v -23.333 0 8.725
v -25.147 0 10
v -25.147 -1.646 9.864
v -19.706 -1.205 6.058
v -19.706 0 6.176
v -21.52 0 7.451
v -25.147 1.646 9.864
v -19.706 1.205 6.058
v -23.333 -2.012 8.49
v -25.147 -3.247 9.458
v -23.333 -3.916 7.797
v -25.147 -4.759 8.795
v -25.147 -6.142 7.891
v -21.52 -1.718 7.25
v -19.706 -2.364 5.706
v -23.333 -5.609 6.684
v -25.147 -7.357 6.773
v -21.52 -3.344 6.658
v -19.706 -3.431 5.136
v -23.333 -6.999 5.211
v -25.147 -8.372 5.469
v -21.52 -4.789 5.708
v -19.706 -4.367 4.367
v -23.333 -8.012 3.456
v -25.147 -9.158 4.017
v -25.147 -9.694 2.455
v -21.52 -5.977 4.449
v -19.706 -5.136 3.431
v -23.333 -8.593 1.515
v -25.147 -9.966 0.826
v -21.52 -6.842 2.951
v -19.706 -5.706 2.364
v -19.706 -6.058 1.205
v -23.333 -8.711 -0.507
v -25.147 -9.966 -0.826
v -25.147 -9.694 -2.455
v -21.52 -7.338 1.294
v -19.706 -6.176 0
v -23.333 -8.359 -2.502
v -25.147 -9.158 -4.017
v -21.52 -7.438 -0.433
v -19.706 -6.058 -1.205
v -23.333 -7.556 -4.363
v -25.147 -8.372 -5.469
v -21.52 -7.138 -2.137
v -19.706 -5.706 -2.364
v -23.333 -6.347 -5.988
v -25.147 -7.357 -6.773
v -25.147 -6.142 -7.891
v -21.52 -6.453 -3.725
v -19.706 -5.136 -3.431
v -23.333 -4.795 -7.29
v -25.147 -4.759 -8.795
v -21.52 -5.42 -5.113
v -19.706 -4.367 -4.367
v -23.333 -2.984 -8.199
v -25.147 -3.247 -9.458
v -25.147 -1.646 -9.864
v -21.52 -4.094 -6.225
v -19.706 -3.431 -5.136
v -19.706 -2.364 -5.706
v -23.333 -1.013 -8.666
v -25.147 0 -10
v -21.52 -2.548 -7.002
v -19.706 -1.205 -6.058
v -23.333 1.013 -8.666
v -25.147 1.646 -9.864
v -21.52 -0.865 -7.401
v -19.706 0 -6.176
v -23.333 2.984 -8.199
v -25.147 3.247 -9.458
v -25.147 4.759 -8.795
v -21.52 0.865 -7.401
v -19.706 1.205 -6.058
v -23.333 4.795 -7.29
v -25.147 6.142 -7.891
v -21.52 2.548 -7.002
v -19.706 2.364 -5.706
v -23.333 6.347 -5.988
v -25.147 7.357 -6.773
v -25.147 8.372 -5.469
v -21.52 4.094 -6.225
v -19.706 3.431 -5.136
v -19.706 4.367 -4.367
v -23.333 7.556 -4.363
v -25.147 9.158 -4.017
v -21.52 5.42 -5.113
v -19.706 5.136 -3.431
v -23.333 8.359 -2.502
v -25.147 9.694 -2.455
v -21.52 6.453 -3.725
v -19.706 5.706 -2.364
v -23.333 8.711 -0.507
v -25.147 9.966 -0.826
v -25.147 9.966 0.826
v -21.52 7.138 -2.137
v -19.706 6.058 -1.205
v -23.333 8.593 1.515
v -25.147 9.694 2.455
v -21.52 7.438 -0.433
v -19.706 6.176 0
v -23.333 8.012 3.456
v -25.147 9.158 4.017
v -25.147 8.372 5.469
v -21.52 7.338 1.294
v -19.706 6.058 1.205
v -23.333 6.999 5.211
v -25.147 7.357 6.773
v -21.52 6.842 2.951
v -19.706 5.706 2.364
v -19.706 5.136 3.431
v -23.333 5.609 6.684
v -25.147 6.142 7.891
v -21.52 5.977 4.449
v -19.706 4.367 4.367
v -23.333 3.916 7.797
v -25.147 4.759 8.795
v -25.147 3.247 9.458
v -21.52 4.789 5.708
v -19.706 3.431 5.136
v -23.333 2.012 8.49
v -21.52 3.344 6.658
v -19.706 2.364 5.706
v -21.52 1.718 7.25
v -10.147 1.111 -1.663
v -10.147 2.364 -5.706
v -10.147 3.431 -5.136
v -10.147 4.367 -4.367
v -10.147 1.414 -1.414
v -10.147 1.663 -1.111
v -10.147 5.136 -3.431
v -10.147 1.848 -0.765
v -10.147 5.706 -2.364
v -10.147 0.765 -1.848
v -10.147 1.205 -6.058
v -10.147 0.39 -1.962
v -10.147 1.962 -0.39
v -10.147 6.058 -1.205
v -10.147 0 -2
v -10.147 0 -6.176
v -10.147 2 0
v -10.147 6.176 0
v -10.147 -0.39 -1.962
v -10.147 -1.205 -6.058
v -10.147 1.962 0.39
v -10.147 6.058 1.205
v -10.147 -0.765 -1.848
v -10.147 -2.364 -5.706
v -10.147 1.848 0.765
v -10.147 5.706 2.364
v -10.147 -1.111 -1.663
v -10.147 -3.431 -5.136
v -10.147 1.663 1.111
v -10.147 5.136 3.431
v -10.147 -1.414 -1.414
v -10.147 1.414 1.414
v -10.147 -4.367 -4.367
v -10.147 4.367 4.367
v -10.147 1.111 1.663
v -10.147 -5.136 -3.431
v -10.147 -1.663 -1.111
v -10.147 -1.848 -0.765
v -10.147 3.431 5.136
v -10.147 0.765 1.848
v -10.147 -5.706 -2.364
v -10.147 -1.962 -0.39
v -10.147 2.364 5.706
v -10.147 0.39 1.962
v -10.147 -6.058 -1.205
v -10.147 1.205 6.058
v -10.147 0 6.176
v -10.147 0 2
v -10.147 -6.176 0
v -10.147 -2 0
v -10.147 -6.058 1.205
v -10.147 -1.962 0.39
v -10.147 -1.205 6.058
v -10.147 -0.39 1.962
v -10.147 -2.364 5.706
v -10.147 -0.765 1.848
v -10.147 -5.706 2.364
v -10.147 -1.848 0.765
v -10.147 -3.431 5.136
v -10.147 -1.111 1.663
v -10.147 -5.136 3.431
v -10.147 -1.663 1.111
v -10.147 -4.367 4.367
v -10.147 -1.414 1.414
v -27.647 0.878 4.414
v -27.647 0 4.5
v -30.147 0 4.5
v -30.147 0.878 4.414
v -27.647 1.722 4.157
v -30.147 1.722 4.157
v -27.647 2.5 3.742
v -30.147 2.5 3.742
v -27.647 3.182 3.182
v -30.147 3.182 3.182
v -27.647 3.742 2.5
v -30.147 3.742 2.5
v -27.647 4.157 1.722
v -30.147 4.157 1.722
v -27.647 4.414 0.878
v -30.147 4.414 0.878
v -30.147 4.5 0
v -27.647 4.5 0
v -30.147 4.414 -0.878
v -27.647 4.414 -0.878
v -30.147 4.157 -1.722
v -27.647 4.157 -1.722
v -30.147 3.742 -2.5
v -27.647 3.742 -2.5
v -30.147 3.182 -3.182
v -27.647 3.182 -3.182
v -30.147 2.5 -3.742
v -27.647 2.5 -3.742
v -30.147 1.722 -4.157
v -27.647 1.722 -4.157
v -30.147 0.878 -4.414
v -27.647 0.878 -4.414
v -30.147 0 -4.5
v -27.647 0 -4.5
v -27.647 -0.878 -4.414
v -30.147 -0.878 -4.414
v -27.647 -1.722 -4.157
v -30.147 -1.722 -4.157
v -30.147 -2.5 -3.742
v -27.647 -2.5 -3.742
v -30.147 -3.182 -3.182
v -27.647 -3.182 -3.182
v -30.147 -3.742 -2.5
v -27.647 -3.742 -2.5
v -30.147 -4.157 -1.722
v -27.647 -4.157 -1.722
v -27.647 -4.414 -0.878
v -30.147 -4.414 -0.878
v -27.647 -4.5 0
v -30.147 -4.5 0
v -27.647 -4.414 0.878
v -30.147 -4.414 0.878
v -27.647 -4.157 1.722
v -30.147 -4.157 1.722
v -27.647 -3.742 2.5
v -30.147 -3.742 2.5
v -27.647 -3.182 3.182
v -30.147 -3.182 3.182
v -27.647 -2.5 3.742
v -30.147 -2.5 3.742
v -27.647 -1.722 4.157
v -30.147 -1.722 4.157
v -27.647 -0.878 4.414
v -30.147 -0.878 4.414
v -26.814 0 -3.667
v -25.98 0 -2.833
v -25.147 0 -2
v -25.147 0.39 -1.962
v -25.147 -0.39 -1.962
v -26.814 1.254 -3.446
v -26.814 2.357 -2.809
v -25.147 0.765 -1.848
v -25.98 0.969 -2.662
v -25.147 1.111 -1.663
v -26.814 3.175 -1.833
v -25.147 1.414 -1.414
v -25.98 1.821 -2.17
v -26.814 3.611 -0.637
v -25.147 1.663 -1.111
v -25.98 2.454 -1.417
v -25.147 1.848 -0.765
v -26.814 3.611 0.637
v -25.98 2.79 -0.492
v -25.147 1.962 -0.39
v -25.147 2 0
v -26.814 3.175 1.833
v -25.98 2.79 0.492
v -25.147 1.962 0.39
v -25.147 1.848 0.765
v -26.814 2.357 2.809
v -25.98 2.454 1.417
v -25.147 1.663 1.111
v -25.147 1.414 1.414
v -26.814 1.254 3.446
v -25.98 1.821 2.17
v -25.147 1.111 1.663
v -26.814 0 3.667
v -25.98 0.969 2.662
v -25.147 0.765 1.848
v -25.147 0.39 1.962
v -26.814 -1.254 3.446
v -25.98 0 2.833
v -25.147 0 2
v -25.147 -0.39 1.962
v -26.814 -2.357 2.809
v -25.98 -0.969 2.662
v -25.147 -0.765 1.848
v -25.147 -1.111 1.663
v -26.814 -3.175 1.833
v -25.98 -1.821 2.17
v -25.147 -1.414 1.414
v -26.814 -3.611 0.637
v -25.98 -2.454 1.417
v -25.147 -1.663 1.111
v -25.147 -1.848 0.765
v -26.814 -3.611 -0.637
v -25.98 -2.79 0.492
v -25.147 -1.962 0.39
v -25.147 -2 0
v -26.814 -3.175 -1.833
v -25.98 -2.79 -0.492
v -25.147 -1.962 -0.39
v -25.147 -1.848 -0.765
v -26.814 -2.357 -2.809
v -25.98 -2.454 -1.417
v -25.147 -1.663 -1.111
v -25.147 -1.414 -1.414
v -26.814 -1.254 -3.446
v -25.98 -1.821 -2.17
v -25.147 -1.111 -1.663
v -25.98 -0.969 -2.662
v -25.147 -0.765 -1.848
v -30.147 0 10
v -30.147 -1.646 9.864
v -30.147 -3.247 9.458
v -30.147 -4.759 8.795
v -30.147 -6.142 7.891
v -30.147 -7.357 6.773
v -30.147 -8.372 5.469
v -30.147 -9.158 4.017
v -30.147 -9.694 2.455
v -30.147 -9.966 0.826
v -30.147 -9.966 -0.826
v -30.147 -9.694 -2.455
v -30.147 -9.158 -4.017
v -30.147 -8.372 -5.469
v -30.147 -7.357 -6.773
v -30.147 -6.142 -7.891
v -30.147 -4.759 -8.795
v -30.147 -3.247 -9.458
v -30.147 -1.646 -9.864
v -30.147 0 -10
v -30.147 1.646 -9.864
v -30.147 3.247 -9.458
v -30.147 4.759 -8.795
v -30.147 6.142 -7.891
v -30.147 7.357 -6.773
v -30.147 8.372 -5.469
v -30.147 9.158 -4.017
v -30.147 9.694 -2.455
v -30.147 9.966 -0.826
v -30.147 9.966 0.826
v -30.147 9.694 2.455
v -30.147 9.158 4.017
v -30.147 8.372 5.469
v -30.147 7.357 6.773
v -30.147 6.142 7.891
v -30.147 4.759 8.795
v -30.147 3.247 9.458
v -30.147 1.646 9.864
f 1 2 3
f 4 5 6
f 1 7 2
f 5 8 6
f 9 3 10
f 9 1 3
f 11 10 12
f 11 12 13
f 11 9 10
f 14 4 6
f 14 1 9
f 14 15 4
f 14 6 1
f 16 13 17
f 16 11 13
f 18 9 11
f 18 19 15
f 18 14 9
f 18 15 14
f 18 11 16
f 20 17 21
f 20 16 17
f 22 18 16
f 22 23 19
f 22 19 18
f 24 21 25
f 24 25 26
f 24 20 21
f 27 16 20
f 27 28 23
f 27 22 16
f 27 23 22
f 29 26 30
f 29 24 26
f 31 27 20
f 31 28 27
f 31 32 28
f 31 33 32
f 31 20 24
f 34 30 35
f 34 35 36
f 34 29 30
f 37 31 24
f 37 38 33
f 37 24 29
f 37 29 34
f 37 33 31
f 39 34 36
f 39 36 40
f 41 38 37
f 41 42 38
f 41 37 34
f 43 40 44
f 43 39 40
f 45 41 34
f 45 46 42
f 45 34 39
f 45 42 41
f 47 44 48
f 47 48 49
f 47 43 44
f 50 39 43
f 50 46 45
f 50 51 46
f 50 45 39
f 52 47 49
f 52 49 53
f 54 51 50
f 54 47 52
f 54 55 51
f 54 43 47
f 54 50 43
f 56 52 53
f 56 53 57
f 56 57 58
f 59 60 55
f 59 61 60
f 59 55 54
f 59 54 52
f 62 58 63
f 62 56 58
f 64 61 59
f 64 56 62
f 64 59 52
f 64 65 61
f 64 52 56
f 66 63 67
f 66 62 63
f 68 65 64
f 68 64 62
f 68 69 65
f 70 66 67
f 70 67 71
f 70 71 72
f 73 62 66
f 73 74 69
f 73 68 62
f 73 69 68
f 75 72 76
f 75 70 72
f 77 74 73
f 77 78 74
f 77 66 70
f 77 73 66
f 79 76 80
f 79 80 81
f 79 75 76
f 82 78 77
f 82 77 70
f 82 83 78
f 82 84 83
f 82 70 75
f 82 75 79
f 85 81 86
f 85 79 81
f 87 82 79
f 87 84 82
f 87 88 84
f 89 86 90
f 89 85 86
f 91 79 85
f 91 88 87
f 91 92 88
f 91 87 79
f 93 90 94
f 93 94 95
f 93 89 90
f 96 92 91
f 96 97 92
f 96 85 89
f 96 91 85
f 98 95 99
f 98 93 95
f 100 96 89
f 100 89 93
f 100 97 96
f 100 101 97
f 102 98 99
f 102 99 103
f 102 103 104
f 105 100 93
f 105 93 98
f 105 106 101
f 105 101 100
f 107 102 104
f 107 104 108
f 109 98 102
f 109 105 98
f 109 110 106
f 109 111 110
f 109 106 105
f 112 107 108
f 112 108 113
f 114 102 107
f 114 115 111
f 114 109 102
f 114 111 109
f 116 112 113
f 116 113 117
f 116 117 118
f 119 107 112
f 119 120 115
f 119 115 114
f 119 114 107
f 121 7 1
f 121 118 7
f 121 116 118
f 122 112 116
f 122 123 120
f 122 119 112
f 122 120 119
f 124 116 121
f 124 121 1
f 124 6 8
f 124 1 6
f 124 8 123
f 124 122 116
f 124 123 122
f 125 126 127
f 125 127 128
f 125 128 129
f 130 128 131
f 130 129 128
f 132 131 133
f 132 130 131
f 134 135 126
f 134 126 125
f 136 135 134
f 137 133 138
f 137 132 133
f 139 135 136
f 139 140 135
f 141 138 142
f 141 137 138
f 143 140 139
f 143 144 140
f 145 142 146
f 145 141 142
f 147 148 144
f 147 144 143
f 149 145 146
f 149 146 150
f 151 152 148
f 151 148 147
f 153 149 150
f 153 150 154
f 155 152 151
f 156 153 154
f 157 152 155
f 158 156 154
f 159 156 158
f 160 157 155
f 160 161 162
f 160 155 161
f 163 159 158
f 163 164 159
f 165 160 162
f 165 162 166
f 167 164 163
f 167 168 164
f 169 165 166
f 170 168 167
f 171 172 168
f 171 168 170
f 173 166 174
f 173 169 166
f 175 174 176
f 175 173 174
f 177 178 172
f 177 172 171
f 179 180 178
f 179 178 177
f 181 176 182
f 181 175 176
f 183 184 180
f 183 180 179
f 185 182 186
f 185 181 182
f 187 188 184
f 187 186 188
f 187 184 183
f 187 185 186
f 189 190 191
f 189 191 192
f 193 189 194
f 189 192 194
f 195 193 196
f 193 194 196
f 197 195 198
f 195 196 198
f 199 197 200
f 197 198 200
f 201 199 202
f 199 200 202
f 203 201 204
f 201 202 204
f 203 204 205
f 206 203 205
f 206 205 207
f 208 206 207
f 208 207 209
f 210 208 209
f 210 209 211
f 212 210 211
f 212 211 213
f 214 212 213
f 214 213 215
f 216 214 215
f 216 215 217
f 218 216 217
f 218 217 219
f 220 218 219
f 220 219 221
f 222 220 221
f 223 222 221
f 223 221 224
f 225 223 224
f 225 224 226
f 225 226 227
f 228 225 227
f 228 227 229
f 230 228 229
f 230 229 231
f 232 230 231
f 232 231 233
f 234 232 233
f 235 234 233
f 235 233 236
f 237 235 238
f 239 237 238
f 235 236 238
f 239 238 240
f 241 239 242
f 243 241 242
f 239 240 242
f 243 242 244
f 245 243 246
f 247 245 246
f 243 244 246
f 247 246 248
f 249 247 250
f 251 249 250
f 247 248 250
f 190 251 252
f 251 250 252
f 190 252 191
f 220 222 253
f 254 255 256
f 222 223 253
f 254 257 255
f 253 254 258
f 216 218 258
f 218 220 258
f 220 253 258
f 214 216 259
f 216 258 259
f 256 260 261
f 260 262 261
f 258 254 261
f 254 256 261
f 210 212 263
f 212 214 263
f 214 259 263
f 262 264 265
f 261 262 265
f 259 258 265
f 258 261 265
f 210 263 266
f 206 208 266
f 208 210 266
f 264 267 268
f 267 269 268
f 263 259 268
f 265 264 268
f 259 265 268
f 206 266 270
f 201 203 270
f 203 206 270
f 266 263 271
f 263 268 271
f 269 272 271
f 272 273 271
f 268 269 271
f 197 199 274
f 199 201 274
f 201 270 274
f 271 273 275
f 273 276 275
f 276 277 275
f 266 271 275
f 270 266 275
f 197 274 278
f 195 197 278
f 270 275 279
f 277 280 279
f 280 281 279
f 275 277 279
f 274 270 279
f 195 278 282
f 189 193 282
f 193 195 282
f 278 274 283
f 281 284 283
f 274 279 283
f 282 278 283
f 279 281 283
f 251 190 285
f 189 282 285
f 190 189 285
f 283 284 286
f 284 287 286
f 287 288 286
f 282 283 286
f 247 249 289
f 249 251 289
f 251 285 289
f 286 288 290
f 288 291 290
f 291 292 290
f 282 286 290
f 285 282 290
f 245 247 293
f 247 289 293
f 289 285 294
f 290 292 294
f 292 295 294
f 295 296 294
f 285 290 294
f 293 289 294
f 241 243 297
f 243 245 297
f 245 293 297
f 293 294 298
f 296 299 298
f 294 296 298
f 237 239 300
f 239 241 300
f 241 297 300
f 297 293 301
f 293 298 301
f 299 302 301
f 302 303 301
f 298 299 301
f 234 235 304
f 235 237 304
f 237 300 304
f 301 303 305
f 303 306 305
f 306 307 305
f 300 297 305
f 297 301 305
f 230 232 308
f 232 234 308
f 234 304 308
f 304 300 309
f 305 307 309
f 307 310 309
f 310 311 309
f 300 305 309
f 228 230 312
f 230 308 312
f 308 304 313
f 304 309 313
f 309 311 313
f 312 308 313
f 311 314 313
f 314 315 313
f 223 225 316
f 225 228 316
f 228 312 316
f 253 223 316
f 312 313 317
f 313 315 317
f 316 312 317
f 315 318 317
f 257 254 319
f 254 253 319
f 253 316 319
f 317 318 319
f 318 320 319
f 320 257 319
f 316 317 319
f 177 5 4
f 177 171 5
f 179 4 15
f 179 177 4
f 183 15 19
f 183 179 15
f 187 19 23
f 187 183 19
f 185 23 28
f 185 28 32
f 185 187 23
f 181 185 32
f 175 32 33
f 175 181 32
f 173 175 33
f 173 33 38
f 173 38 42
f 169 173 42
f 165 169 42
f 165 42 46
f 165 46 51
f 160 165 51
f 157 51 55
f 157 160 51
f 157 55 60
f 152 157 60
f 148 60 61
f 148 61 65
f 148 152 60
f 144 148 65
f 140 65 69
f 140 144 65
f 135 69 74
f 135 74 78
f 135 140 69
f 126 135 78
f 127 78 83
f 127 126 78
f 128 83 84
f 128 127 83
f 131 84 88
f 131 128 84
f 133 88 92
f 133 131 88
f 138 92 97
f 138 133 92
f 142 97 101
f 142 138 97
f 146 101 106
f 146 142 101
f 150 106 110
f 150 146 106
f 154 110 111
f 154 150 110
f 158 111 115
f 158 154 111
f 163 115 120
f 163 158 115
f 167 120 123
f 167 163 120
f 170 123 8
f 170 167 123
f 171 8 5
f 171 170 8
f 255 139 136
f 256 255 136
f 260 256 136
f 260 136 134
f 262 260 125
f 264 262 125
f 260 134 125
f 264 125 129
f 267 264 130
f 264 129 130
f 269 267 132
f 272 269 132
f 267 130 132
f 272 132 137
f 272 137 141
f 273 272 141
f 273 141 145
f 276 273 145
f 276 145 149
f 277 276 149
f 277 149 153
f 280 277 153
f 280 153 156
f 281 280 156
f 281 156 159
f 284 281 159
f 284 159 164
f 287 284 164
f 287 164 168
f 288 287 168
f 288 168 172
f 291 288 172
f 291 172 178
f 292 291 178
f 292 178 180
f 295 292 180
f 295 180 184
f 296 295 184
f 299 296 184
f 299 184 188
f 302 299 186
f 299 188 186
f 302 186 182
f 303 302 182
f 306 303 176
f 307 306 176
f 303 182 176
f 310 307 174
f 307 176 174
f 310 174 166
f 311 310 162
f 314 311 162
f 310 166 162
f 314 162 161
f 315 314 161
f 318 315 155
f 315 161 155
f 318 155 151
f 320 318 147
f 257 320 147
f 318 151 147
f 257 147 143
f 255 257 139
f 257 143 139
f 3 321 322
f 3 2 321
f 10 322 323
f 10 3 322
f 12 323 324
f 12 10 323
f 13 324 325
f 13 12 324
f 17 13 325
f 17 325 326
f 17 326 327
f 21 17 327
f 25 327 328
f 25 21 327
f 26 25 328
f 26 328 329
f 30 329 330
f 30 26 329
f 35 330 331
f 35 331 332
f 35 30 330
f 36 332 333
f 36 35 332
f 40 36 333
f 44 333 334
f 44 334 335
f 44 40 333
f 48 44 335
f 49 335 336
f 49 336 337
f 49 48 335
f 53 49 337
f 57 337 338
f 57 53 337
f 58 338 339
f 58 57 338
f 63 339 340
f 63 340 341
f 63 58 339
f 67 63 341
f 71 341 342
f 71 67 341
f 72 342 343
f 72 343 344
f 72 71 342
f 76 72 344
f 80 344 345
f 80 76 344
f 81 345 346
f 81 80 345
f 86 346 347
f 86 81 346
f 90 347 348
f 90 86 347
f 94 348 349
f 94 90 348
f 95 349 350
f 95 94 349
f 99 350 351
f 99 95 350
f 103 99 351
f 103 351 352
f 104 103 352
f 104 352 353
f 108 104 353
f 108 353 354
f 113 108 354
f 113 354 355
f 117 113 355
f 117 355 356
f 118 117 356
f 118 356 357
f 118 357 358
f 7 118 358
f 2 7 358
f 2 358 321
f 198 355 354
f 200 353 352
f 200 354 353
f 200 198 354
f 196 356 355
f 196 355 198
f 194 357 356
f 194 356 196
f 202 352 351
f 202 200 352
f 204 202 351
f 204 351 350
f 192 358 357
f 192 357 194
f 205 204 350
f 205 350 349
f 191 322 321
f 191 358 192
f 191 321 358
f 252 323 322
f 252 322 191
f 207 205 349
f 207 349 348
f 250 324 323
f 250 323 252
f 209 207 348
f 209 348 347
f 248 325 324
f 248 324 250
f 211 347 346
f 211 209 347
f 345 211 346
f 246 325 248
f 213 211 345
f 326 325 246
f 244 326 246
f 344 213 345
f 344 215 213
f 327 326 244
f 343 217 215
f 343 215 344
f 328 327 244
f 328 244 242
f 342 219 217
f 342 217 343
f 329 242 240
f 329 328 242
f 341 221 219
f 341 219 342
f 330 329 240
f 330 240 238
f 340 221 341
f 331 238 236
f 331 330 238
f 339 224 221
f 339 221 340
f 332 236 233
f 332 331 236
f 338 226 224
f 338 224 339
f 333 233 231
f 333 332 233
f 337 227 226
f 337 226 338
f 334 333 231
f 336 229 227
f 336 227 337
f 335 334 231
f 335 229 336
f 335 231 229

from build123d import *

# Parameters (mm, degrees)
SKETCH2_R          = 2
CUT_EXTRUDE2_DEPTH = 18
SKETCH3_R          = 4.5
CUT_EXTRUDE3_DEPTH = 2
CHAMFER2_SIZE      = 3


with BuildPart() as part:
    # Sketch1 → Revolve1 (revolve)
    with BuildSketch(Plane(origin=(0, 0, 0), x_dir=(1, 0, 0), z_dir=(0, 1, 0)), mode=Mode.PRIVATE) as revolve1_sk:
        Polygon((-30.147058824, 0), (-30.147058824, 10), (-25.147058824, 10), (-19.705882353, 6.176470588), (-10.147058824, 6.176470588), (-10.147058824, 0), align=None)
    revolve(revolve1_sk.sketch.rotate(Axis((-68.088235294, 0, 0), (1, 0, 0)), 180), axis=Axis((-68.088235294, 0, 0), (1, 0, 0)))

    # Sketch2 → Cut-Extrude2 (cut)
    with BuildSketch(Plane(origin=(-10.147058824, 0, 0), x_dir=(0, 0, -1), z_dir=(1, 0, 0))):
        Circle(SKETCH2_R)
    extrude(amount=-CUT_EXTRUDE2_DEPTH, mode=Mode.SUBTRACT)

    # Sketch3 → Cut-Extrude3 (cut)
    with BuildSketch(Plane.ZY.offset(30.147058824)):
        Circle(SKETCH3_R)
    extrude(amount=-CUT_EXTRUDE3_DEPTH, mode=Mode.SUBTRACT)

    # Chamfer2
    # the kernel refuses this chamfer: 3 mm, written as the material it takes off along each edge
    with BuildSketch(Plane(origin=(-28.147058824, 0, 0), x_dir=(0, 0, -1), z_dir=(0, -1, 0))) as chamfer2_piece_1_section:
        Polygon((2 + CHAMFER2_SIZE, 0), (2, CHAMFER2_SIZE), (2, 0), align=None)
    chamfer2_piece_1 = revolve(axis=Axis((-28.147058824, 0, 0), (1, 0, 0)), mode=Mode.PRIVATE)
    chamfer2_piece_1 = chamfer2_piece_1 & Plane(origin=(-26.385999782, 0, 0), x_dir=(0, 0, 1), z_dir=(-1, 0, 0)) * Cylinder(4.5, 20, mode=Mode.PRIVATE)
    add(chamfer2_piece_1, mode=Mode.SUBTRACT)


solid = part.part
